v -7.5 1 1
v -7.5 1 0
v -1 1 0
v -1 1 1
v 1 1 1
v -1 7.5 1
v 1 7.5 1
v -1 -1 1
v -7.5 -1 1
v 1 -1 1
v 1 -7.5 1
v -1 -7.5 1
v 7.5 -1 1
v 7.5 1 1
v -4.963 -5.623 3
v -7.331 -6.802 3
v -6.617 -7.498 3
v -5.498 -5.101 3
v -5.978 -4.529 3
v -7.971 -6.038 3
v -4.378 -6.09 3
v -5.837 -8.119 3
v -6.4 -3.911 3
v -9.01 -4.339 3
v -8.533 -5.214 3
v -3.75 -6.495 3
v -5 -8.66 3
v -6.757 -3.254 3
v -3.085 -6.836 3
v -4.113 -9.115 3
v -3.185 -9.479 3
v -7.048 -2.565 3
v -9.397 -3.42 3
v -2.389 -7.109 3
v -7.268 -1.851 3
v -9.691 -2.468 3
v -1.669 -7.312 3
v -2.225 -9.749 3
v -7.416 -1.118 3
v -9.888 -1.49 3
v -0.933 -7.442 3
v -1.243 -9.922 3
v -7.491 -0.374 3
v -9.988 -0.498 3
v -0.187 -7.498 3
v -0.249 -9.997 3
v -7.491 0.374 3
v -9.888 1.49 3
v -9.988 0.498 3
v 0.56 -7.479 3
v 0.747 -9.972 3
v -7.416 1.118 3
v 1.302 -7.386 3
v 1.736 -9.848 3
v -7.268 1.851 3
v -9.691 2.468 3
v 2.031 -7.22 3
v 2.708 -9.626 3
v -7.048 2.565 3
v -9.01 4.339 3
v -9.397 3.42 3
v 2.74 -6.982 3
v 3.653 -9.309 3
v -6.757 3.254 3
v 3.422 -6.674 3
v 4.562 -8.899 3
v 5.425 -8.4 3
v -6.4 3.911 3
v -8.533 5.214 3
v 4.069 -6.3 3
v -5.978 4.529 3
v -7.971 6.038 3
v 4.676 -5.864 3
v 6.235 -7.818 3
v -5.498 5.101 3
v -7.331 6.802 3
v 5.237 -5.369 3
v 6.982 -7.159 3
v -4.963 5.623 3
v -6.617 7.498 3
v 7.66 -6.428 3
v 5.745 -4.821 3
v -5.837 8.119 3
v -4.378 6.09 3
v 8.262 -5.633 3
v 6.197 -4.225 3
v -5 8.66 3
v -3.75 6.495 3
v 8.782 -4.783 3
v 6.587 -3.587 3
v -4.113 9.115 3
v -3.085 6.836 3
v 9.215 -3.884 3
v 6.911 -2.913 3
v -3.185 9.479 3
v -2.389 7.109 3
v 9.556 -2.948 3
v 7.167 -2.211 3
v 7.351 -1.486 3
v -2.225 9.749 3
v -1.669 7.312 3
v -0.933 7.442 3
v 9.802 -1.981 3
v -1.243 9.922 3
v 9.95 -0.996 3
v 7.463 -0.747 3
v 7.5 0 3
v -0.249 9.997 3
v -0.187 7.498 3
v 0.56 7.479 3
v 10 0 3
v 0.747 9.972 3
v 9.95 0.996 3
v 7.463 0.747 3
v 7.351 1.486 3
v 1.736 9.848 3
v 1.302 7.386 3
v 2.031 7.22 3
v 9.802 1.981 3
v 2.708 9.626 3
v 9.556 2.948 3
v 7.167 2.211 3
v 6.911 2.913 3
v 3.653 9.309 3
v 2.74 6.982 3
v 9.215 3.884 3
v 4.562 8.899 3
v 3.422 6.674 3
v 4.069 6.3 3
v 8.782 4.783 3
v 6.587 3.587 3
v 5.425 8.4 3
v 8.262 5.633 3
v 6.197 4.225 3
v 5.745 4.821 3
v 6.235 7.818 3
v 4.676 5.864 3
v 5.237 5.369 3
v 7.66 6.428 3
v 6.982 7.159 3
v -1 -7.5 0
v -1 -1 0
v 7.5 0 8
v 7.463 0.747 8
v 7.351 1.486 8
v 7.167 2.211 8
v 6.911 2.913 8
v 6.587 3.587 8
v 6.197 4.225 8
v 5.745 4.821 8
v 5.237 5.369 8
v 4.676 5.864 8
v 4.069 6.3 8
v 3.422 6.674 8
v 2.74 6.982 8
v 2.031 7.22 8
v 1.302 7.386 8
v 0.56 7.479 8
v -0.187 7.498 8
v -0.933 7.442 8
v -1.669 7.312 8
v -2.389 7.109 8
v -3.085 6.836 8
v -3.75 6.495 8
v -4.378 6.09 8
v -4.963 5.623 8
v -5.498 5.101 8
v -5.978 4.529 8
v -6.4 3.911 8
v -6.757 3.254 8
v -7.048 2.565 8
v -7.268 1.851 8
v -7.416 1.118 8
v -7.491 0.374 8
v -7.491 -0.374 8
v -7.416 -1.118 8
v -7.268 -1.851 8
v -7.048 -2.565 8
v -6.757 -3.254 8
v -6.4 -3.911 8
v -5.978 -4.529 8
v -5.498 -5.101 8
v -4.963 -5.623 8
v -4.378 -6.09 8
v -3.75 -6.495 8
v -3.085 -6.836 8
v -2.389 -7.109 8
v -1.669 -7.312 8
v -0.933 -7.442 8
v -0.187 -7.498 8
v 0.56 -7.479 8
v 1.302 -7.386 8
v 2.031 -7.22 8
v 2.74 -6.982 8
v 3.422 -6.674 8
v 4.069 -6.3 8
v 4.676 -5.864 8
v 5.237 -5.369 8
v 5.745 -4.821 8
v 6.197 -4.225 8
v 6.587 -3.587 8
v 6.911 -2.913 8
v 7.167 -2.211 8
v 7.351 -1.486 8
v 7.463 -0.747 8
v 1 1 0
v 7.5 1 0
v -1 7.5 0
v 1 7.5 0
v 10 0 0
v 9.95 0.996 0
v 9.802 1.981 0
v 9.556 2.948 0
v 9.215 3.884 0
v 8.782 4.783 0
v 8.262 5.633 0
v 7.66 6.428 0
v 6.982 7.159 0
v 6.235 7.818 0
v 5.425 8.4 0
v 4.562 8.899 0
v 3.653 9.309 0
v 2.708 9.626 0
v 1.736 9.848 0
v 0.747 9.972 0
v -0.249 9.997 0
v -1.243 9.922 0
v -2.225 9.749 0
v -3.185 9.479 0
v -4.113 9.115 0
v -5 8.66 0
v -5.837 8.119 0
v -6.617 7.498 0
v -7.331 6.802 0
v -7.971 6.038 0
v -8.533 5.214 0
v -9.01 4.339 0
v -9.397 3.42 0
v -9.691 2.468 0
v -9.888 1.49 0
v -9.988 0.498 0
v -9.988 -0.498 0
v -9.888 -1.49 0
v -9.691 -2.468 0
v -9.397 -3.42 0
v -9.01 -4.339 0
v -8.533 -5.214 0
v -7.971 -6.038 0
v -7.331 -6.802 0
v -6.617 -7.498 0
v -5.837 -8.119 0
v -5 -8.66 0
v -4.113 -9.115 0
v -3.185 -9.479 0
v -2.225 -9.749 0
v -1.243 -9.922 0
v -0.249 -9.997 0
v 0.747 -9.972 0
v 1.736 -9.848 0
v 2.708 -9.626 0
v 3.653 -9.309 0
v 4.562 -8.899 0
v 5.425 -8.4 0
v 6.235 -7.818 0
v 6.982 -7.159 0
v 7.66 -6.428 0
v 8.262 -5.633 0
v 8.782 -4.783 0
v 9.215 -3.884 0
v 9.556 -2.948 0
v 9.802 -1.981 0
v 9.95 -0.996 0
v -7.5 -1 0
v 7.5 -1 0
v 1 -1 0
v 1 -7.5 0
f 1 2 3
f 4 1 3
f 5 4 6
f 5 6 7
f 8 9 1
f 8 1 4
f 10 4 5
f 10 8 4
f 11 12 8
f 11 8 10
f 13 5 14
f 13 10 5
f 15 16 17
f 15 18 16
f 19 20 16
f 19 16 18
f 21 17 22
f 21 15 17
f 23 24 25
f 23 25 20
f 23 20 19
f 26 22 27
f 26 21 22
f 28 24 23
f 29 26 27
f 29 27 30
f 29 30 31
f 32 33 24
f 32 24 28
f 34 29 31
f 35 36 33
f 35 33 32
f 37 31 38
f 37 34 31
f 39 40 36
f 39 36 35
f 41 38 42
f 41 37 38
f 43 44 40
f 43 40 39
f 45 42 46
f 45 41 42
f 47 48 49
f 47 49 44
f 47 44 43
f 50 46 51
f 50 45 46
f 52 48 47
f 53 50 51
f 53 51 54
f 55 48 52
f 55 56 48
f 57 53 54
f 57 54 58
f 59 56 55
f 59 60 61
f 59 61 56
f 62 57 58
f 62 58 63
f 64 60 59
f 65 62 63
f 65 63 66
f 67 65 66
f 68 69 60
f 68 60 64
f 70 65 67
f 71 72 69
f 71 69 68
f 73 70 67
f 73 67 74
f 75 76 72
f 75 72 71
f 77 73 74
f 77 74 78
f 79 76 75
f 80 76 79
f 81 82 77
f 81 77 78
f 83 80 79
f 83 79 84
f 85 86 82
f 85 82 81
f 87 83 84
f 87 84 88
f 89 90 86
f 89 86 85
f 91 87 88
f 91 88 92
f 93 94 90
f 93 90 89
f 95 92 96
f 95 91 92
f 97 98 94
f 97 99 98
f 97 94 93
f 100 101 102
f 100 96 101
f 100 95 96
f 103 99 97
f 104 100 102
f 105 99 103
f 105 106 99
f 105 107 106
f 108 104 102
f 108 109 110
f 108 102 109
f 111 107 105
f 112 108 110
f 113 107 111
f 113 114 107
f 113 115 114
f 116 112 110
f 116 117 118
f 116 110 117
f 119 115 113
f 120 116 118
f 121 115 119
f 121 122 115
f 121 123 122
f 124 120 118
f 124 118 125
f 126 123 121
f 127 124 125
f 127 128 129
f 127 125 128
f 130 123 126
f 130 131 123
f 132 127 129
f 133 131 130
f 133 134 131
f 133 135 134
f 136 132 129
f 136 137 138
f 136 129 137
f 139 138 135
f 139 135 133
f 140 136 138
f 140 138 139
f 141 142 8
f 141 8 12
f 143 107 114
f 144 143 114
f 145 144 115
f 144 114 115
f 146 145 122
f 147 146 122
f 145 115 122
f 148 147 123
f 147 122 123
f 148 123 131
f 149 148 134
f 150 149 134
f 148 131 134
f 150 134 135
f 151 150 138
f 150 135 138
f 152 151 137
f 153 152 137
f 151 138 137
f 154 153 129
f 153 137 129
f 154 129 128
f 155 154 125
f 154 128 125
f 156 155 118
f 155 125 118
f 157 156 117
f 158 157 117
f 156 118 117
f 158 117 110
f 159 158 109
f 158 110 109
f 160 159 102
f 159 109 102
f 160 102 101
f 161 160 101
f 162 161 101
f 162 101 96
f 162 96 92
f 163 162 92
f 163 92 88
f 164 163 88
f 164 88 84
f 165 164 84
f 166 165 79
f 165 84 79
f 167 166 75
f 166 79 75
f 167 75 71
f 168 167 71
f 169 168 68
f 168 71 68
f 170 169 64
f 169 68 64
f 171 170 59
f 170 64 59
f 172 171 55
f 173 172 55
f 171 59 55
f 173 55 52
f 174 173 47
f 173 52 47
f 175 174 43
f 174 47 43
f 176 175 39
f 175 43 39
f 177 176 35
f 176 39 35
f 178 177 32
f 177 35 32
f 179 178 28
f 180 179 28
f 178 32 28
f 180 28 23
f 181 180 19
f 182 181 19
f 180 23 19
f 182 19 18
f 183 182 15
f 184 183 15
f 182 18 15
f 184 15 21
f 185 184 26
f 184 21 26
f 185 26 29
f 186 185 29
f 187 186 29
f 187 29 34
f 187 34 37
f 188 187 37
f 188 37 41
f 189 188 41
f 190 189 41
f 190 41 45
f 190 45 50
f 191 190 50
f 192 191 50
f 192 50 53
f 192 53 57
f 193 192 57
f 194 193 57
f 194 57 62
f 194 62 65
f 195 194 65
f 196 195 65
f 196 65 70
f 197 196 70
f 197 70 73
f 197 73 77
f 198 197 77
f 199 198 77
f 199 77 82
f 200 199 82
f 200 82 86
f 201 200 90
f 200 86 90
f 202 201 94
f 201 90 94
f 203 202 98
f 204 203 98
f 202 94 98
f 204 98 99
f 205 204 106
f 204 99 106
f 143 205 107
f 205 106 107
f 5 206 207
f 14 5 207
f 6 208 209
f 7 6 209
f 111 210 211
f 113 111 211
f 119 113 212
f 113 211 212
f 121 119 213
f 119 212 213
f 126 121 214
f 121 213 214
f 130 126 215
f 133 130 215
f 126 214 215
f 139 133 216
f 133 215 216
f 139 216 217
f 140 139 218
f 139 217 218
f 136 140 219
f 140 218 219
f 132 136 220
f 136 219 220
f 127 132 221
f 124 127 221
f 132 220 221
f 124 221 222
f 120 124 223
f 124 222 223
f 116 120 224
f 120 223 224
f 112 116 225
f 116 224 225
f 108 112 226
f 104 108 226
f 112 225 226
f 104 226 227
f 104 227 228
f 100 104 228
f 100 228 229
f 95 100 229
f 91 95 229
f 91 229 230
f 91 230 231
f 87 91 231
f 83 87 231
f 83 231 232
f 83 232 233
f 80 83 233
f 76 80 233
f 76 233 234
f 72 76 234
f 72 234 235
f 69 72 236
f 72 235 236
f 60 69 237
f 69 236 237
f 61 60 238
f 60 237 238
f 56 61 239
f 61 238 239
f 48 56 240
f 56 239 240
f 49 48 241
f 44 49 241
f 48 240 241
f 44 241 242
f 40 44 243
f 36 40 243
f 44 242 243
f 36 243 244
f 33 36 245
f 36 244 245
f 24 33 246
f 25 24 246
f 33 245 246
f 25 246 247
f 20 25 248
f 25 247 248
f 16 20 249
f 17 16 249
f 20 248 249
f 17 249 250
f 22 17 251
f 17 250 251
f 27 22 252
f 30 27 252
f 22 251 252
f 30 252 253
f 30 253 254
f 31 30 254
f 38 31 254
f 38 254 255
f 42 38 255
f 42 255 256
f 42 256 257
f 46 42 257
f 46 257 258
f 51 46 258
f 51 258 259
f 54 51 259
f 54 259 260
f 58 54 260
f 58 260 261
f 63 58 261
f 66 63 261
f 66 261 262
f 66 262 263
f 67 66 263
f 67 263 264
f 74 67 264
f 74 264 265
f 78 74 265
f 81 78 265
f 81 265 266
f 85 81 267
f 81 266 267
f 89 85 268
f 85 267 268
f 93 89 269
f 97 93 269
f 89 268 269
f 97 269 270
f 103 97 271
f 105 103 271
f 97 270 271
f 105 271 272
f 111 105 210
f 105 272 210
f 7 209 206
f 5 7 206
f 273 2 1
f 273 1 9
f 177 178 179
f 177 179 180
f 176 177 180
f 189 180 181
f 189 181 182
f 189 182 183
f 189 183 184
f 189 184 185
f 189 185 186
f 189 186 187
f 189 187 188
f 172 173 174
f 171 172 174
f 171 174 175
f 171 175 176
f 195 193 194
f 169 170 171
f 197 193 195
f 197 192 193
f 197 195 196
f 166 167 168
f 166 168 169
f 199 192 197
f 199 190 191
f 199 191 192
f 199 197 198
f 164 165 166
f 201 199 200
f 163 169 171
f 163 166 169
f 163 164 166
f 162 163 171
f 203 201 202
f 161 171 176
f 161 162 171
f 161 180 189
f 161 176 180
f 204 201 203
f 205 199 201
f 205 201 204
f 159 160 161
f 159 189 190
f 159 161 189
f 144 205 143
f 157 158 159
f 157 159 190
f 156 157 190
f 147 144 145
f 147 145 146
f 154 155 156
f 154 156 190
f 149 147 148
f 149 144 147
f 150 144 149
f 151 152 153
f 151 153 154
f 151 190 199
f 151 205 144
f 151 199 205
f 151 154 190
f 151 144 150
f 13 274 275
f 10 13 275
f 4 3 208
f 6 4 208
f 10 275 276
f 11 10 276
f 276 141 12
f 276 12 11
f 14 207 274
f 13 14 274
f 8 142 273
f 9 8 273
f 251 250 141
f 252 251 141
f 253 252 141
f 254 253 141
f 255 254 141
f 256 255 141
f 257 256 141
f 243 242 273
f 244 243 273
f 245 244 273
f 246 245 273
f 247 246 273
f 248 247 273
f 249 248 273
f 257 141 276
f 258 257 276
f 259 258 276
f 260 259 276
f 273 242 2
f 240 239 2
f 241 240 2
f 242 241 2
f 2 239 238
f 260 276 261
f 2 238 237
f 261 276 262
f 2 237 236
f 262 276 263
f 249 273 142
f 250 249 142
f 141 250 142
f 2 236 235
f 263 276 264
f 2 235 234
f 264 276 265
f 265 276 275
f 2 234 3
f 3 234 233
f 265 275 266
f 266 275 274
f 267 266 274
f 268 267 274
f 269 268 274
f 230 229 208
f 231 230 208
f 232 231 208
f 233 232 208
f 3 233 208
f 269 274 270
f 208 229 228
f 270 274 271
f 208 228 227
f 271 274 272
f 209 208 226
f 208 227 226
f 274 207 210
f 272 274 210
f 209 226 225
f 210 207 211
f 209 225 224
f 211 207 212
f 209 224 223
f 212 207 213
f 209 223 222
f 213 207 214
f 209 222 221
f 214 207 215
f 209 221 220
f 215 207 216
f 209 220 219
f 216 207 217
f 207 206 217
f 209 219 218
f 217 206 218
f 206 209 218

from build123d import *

# Parameters (mm, degrees)
F0_R     = 10
F1_DEPTH = 3
F2_R     = 7.5
F3_DEPTH = 5
F4_W     = 6.5
F4_H     = 2
F4_W_2   = 2
F4_H_2   = 6.5
F5_DEPTH = 1


with BuildPart() as f1:
    # F0 (on Top) → F1 (new body)
    with BuildSketch(Plane.XY):
        Circle(F0_R)
    extrude(amount=F1_DEPTH)

    # F2 (on face) → F3 (join)
    with BuildSketch(Plane.XY.offset(3)):
        Circle(F2_R)
    extrude(amount=F3_DEPTH)

    # F4 (on face) → F5 (cut)
    with BuildSketch(Plane(origin=(0, 0, 0), x_dir=(1, 0, 0), z_dir=(0, 0, -1))):
        with Locations((4.25, 0)):
            Rectangle(F4_W, F4_H)
        with Locations((0, -4.25)):
            Rectangle(F4_W_2, F4_H_2)
        Rectangle(F4_W_2, F4_H)
        with Locations((-4.25, 0)):
            Rectangle(F4_W, F4_H)
        with Locations((0, 4.25)):
            Rectangle(F4_W_2, F4_H_2)
    extrude(amount=-F5_DEPTH, mode=Mode.SUBTRACT)


solid = f1.part
